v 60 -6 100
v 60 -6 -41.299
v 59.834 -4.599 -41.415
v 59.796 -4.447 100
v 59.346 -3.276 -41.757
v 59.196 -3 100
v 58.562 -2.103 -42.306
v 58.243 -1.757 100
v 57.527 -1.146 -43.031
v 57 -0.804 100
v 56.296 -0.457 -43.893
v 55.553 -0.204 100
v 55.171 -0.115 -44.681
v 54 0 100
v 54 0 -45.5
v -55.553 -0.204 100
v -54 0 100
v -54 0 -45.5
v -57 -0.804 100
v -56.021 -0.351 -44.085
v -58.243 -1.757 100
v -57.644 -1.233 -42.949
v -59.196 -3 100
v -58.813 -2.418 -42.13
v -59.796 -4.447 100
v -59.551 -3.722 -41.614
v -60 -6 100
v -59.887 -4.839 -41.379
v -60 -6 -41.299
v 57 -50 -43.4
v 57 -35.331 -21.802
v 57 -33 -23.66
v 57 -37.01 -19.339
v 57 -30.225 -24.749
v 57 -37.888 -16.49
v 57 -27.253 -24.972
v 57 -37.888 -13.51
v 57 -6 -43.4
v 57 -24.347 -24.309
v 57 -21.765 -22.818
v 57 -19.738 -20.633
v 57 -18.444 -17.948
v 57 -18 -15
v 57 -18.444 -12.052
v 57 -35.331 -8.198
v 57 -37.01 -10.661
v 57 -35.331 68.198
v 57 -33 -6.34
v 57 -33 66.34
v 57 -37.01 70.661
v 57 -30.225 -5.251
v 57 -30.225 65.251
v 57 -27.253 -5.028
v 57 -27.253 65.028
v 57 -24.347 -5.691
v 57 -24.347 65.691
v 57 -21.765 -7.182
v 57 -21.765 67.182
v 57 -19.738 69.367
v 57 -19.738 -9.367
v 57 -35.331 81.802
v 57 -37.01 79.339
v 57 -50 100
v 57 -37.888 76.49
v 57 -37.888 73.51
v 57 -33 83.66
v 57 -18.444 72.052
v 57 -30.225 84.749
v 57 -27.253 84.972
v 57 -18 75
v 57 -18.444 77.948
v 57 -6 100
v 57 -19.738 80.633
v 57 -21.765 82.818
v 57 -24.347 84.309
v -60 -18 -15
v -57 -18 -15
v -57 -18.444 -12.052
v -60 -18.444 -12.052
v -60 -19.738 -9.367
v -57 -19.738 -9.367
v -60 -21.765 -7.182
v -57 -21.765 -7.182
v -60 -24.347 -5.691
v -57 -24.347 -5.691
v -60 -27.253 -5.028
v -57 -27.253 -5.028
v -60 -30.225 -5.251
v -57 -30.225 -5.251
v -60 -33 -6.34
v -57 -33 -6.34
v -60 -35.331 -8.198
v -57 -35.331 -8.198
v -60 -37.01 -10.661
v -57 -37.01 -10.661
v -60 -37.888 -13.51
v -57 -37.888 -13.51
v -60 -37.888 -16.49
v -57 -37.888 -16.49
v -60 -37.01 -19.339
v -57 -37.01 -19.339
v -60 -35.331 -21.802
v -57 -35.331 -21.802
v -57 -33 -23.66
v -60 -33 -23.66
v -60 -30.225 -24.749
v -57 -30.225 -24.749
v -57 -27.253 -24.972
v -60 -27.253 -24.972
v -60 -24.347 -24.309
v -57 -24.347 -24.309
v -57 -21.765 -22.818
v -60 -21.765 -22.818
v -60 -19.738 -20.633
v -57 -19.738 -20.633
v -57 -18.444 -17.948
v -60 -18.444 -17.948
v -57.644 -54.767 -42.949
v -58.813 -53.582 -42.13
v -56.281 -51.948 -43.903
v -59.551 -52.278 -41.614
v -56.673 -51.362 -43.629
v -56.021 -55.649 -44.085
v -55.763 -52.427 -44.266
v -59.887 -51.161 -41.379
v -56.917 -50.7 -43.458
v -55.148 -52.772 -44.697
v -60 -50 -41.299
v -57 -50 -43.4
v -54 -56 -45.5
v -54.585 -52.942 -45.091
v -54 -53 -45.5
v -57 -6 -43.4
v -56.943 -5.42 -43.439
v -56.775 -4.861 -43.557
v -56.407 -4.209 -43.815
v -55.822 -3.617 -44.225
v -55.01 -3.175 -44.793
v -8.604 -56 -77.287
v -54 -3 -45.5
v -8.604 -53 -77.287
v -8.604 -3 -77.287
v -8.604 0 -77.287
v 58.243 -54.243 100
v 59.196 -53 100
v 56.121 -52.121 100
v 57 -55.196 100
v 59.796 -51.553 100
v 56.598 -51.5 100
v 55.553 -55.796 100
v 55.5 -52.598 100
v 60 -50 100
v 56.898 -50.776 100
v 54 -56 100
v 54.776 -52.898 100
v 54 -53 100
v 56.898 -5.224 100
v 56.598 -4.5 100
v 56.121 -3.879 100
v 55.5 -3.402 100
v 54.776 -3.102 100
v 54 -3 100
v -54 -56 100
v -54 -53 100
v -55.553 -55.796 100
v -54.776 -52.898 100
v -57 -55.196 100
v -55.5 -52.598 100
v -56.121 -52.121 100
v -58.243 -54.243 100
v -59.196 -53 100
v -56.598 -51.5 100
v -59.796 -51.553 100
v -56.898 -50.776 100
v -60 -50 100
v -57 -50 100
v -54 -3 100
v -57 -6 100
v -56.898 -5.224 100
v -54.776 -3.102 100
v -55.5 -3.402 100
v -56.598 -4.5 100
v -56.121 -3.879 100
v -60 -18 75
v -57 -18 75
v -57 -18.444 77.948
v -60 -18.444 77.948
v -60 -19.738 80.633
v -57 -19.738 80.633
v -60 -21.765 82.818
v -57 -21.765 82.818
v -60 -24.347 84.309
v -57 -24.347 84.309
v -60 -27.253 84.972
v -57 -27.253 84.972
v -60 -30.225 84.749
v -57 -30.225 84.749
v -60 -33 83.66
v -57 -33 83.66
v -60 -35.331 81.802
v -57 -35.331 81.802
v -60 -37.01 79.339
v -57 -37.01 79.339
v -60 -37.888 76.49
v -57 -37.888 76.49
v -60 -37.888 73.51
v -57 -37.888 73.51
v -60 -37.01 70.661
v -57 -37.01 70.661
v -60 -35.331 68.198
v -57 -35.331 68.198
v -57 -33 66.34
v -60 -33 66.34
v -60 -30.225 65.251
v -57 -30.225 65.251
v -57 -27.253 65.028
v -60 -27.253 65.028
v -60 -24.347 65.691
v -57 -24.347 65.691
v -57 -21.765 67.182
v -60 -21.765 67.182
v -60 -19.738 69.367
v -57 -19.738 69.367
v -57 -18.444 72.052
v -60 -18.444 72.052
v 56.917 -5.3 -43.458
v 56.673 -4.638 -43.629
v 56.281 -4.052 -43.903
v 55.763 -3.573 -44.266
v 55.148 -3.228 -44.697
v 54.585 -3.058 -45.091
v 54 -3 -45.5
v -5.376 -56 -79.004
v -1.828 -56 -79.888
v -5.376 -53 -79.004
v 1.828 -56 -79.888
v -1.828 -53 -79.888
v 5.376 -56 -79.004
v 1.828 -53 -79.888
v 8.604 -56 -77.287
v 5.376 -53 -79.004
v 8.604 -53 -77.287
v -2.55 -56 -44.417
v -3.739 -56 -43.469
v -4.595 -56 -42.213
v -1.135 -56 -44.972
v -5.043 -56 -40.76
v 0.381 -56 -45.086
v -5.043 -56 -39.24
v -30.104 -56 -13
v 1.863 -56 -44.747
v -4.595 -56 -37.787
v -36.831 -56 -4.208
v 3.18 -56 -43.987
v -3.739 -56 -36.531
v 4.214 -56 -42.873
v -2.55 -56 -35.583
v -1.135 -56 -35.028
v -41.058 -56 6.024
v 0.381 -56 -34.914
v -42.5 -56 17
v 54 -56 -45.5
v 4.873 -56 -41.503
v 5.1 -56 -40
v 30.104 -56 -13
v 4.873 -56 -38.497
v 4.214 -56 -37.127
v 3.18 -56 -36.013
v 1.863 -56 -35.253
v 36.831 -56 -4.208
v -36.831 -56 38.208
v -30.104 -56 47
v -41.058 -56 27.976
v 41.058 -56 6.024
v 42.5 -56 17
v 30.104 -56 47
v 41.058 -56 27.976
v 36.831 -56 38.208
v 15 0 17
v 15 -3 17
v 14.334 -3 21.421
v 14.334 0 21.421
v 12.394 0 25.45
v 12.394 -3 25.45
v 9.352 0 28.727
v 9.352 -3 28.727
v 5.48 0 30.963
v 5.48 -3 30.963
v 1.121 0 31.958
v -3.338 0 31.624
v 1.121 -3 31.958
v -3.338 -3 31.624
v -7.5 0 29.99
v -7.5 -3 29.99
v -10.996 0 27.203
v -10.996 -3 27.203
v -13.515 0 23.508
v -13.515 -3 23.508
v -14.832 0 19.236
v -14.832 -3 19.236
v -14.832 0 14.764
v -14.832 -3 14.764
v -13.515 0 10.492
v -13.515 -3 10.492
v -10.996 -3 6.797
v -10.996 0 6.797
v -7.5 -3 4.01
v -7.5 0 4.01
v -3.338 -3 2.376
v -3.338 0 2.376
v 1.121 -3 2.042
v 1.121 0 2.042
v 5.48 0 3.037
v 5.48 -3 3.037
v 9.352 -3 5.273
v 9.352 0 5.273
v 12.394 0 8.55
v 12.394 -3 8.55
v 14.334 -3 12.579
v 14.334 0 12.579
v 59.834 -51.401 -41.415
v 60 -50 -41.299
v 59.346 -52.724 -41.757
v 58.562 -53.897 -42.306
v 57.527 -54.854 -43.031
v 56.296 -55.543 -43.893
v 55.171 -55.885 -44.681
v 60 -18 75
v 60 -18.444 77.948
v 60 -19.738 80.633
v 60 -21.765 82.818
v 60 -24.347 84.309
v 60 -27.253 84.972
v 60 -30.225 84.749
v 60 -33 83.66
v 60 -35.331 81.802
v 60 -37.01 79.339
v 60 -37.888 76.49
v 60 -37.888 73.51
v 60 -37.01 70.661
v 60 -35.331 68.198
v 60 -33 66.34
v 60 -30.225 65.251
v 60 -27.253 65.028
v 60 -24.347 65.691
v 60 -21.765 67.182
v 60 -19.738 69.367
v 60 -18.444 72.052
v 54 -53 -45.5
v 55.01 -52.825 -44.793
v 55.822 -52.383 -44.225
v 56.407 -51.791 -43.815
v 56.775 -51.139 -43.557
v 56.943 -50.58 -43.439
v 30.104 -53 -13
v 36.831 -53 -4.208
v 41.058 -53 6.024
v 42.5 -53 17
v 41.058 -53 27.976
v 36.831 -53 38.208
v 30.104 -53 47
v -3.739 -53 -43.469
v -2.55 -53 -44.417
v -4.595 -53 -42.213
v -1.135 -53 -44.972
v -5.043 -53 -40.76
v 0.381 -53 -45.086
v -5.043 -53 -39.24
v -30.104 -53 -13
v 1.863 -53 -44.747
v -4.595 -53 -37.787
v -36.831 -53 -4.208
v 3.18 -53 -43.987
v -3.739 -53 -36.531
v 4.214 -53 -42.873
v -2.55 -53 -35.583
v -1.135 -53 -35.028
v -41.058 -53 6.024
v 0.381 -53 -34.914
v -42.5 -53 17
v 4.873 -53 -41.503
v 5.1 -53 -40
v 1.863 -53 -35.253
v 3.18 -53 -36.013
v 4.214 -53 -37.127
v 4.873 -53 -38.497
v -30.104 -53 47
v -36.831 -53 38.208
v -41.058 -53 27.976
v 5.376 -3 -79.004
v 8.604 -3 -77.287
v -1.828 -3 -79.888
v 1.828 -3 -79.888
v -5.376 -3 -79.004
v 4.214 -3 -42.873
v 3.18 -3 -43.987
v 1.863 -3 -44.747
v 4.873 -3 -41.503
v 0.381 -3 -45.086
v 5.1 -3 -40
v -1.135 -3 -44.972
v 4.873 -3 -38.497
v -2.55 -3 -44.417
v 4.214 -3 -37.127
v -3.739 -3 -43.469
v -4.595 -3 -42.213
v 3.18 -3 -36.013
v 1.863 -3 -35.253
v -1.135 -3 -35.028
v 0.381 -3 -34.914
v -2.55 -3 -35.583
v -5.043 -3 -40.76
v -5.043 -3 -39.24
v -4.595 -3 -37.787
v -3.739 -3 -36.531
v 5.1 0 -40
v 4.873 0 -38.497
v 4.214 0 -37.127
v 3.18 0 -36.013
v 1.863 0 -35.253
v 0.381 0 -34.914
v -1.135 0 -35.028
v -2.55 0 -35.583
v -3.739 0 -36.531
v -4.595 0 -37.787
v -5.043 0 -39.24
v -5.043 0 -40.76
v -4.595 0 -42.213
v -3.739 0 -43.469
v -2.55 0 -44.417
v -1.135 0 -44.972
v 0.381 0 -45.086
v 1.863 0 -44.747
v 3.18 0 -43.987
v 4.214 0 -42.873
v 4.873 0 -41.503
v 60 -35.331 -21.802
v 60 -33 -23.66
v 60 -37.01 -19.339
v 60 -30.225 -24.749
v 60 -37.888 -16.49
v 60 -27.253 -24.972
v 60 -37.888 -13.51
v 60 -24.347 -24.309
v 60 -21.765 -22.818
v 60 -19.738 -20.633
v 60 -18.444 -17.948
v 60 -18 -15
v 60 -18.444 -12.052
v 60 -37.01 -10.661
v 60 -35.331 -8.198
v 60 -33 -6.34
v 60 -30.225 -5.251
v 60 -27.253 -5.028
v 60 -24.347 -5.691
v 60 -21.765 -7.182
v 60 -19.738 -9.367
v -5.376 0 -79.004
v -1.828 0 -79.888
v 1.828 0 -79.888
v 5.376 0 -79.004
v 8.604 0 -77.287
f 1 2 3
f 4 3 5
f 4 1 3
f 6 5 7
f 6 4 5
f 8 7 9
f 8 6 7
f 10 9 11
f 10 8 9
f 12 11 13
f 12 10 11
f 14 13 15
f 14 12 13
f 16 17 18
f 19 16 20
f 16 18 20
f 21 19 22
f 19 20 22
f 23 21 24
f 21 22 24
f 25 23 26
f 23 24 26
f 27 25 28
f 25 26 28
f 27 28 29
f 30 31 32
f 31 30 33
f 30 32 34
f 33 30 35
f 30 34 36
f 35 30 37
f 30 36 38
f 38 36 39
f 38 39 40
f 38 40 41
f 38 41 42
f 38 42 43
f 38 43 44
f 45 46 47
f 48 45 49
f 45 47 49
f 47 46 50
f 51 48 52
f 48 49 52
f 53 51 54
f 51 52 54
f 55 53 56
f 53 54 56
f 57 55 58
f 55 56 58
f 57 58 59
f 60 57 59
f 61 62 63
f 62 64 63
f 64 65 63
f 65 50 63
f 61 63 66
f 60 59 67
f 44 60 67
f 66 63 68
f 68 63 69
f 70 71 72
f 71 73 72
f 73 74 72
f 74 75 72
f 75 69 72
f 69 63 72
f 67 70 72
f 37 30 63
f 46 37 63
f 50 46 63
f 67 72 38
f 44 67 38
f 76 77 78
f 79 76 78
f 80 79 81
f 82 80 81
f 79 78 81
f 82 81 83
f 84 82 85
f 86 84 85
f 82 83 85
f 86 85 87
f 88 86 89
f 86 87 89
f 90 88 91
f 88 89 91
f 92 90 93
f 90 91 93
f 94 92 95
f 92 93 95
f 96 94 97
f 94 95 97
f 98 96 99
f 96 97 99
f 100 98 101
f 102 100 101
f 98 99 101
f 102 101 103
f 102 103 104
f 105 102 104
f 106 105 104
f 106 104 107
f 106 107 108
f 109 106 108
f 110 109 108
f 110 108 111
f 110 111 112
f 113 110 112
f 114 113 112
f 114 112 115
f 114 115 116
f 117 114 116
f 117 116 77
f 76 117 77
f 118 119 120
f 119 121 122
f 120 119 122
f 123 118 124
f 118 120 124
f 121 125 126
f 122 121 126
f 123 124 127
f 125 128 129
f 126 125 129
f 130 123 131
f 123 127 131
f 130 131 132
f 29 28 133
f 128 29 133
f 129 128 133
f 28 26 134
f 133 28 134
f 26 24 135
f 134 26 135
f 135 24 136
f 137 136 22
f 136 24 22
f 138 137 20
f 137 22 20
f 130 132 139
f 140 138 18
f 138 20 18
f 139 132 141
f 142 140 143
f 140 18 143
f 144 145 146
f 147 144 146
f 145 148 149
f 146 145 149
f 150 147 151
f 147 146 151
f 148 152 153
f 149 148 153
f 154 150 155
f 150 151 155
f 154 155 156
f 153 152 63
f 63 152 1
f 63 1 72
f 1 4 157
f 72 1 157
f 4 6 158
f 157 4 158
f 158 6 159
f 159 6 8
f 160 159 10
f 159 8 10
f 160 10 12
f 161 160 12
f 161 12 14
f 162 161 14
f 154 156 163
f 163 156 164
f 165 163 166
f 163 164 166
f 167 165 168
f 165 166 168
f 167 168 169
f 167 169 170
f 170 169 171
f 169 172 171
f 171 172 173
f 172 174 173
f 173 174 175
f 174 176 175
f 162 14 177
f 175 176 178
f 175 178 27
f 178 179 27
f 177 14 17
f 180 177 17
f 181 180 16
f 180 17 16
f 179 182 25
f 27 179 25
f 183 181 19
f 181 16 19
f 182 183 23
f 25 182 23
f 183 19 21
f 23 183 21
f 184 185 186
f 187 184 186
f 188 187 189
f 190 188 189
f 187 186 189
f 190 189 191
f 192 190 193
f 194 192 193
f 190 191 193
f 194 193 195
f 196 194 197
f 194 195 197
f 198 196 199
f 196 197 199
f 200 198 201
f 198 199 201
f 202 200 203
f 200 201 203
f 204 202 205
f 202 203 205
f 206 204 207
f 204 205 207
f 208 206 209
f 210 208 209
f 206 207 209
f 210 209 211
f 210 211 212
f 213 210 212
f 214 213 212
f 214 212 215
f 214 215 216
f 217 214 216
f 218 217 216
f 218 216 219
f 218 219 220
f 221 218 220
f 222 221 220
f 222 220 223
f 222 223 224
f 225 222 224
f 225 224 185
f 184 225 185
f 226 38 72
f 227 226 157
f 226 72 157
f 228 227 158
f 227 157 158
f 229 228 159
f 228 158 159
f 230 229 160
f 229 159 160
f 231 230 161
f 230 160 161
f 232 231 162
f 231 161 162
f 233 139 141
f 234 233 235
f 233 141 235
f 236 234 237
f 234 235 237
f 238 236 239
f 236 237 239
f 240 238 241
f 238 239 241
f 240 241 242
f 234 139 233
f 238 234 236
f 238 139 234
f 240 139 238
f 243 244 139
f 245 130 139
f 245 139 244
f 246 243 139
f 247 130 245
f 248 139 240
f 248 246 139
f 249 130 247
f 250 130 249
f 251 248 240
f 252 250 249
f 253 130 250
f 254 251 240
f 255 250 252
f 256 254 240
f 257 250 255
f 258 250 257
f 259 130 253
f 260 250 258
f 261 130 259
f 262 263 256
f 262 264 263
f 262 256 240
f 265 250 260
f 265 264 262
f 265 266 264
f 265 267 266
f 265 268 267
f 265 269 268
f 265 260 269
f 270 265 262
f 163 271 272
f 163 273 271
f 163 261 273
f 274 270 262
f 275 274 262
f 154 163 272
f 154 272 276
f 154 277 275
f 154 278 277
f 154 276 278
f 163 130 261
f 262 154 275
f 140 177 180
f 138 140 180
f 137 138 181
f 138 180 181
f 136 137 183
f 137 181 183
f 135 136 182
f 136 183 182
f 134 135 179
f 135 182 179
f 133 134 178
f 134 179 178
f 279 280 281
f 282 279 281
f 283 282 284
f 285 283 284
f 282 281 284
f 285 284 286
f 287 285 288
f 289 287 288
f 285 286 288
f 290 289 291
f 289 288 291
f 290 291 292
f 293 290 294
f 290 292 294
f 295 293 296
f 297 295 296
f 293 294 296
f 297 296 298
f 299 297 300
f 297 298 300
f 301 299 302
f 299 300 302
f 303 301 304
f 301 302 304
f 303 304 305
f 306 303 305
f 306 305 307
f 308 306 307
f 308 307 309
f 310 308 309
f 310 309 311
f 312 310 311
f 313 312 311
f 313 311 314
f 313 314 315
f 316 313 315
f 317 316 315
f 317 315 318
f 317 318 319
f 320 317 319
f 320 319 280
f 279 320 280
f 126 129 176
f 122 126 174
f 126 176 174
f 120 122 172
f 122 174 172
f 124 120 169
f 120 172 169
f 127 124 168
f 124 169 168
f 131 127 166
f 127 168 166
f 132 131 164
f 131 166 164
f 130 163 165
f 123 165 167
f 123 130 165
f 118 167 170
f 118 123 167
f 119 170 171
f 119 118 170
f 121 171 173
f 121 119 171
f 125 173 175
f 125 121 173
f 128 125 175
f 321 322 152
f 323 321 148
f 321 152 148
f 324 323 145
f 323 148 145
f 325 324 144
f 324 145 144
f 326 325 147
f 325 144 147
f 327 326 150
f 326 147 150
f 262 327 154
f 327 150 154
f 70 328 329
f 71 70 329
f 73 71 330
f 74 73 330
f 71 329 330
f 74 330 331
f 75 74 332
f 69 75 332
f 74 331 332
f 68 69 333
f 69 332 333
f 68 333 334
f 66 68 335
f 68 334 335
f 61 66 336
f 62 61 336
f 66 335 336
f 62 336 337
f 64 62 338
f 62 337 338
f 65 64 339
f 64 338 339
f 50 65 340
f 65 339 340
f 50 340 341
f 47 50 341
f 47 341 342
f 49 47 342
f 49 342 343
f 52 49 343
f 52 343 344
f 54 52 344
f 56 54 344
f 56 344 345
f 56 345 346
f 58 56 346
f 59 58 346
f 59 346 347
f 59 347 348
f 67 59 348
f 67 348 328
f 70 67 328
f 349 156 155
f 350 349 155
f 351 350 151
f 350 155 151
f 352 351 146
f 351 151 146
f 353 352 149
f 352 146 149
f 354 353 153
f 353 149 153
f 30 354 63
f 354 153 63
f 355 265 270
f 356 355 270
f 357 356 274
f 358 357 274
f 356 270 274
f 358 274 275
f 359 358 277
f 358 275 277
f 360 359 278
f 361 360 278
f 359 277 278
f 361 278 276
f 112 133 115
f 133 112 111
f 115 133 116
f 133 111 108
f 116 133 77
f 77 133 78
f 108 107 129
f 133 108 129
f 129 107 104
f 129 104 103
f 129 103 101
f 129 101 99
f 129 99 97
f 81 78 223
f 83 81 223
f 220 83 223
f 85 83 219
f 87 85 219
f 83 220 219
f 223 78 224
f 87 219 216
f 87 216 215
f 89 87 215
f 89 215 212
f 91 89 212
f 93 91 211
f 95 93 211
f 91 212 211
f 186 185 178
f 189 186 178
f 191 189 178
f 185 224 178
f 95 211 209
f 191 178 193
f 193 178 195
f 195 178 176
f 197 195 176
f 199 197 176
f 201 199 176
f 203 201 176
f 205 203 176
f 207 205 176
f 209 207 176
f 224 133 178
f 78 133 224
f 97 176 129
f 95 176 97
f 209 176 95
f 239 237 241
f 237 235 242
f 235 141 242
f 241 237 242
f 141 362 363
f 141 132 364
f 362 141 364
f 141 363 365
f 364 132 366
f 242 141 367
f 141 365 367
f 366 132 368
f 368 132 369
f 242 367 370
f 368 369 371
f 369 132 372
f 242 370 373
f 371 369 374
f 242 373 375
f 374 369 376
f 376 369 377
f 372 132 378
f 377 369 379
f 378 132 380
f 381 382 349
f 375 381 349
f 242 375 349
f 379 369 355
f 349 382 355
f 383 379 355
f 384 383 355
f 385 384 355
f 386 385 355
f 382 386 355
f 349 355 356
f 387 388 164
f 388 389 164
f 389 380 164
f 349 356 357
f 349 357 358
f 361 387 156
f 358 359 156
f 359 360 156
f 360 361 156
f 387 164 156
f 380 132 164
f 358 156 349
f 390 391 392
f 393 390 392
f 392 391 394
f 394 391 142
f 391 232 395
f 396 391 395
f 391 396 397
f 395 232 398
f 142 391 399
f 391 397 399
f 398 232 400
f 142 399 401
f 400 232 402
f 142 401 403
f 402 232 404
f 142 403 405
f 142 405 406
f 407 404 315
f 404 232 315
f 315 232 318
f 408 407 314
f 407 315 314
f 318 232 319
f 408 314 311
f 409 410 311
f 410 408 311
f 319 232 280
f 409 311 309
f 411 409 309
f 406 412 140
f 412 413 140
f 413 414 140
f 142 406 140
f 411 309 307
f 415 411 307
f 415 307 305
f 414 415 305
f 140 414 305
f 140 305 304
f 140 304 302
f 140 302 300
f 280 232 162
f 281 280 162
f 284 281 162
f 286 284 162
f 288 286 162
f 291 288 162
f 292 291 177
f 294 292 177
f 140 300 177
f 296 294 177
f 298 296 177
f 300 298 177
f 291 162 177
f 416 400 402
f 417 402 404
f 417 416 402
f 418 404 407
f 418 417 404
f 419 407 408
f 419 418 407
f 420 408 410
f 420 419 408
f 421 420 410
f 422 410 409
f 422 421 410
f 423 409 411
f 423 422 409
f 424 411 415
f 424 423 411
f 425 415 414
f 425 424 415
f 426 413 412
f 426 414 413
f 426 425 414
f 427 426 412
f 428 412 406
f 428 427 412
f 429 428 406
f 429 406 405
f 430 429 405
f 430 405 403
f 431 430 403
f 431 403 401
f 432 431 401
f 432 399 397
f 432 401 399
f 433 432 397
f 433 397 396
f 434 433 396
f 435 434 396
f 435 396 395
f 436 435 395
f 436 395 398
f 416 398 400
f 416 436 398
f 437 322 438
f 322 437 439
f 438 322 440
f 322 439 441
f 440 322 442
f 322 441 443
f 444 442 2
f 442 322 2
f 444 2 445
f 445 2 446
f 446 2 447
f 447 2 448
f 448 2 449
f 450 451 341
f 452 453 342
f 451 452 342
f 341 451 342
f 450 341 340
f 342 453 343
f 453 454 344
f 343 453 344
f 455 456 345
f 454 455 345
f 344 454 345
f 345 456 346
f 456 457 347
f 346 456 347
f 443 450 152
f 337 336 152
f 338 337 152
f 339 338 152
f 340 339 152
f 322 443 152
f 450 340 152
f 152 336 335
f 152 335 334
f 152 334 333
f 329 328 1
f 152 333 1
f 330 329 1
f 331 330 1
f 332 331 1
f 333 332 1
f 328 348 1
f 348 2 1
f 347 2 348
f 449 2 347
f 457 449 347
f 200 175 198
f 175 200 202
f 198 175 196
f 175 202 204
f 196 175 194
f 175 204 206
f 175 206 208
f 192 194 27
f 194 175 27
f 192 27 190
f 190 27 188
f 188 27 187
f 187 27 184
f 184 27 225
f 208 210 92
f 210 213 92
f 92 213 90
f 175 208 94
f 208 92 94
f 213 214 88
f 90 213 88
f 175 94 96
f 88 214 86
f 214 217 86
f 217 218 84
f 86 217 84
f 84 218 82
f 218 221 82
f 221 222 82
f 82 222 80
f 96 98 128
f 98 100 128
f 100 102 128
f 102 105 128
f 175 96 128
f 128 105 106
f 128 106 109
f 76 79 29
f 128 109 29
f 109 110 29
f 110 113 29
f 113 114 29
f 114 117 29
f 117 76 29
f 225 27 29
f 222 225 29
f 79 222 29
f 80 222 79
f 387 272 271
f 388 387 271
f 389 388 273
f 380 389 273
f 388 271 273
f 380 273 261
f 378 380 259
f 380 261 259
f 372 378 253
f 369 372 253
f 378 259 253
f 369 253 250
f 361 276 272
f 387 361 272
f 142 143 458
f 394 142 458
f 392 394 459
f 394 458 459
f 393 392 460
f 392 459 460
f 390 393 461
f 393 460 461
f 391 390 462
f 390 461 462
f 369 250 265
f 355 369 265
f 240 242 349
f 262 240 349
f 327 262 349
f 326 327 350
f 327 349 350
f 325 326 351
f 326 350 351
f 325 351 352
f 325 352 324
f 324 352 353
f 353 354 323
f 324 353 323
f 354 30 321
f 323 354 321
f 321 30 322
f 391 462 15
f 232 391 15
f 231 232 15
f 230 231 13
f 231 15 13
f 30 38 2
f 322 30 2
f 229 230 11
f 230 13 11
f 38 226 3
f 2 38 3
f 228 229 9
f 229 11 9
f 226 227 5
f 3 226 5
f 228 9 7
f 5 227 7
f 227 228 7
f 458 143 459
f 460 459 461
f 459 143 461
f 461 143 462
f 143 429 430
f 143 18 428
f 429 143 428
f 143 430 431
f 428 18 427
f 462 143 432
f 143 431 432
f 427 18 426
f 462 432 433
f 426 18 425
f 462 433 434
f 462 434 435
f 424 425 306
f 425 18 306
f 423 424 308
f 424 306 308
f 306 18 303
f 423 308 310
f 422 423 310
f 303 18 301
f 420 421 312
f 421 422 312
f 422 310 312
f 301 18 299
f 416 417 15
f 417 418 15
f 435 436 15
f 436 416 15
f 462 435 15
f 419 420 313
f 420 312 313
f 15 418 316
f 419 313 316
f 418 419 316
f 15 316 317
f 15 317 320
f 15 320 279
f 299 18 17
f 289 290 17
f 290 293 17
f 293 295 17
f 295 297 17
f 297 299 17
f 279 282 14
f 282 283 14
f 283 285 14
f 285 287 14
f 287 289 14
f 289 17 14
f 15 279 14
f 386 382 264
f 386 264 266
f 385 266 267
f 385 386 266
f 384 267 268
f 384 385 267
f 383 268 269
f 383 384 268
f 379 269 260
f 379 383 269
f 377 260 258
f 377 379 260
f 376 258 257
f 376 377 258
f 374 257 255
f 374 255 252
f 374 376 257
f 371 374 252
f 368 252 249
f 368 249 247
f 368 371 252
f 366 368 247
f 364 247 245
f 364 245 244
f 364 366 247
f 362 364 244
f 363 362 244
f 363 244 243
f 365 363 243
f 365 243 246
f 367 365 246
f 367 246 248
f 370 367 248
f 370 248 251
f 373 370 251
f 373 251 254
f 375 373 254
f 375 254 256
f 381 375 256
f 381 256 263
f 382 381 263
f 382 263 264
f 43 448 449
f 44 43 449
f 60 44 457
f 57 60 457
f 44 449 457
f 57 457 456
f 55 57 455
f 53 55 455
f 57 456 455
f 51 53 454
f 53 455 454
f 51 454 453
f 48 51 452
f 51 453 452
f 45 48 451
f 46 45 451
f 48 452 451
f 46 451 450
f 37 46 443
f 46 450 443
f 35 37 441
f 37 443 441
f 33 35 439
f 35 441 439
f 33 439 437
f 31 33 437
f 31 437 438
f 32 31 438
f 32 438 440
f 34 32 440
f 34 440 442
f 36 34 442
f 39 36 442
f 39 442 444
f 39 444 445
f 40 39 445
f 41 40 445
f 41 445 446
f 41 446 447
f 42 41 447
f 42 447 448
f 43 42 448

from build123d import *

# Parameters (mm, degrees)
F0_R     = 5.1
F1_DEPTH = 56
F3_DEPTH = 180.001
F5_DEPTH = 3
F6_R     = 15
F7_DEPTH = 25
F8_R     = 10
F9_DEPTH = 120.001
F10_R    = 6


with BuildPart() as f1:
    # F0 (on Front) → F1 (new body)
    with BuildSketch(Plane.XZ):
        with BuildLine():
            Line((60, 100), (-60, 100))
            Line((-60, 100), (-60, -41.2991665388))
            Line((-60, -41.2991665388), (-8.6036465453, -77.2872806643))
            ThreePointArc((-8.6036465453, -77.2872806643), (0, -80), (8.6036465453, -77.2872806643))
            Line((8.6036465453, -77.2872806643), (60, -41.2991665388))
            Line((60, -41.2991665388), (60, 100))
        make_face()
        with Locations((0, -40)):
            Circle(F0_R, mode=Mode.SUBTRACT)
    extrude(amount=F1_DEPTH)

    # F2 (on face) → F3 (cut, through all)
    with BuildSketch(Plane.XY.offset(100)):
        with BuildLine():
            Line((54, -3), (-54, -3))
            ThreePointArc((-54, -3), (-56.1213203436, -3.8786796564), (-57, -6))
            Line((-57, -6), (-57, -50))
            ThreePointArc((-57, -50), (-56.1213203436, -52.1213203436), (-54, -53))
            Line((-54, -53), (54, -53))
            ThreePointArc((54, -53), (56.1213203436, -52.1213203436), (57, -50))
            Line((57, -50), (57, -6))
            ThreePointArc((57, -6), (56.1213203436, -3.8786796564), (54, -3))
        make_face()
    extrude(amount=-F3_DEPTH, mode=Mode.SUBTRACT)

    # F4 (on face) → F5 (cut, through all)
    with BuildSketch(Plane.XZ.offset(56)):
        with BuildLine():
            Line((30.103986447, 47), (-30.103986447, 47))
            ThreePointArc((-30.103986447, 47), (-42.5, 17), (-30.103986447, -13))
            Line((-30.103986447, -13), (30.103986447, -13))
            ThreePointArc((30.103986447, -13), (42.5, 17), (30.103986447, 47))
        make_face()
    extrude(amount=-F5_DEPTH, mode=Mode.SUBTRACT)

    # F6 (on face) → F7 (cut)
    with BuildSketch(Plane.XZ.offset(3)):
        with Locations((0, 17.0000000293)):
            Circle(F6_R)
    extrude(amount=-F7_DEPTH, mode=Mode.SUBTRACT)

    # F8 (on face) → F9 (cut, through all)
    with BuildSketch(Plane.YZ.offset(60)):
        with Locations((-28, 75)):
            Circle(F8_R)
        with Locations((-28, -15)):
            Circle(F8_R)
    extrude(amount=-F9_DEPTH, mode=Mode.SUBTRACT)

    # F10
    f10_edges = [f1.edges().sort_by_distance(p)[0] for p in [
        (-60, -56, 29.350417),
        (60, -56, 29.350417),
        (-60, 0, 29.350417),
        (60, 0, 29.350417),
    ]]
    fillet(f10_edges, radius=F10_R)


solid = f1.part
